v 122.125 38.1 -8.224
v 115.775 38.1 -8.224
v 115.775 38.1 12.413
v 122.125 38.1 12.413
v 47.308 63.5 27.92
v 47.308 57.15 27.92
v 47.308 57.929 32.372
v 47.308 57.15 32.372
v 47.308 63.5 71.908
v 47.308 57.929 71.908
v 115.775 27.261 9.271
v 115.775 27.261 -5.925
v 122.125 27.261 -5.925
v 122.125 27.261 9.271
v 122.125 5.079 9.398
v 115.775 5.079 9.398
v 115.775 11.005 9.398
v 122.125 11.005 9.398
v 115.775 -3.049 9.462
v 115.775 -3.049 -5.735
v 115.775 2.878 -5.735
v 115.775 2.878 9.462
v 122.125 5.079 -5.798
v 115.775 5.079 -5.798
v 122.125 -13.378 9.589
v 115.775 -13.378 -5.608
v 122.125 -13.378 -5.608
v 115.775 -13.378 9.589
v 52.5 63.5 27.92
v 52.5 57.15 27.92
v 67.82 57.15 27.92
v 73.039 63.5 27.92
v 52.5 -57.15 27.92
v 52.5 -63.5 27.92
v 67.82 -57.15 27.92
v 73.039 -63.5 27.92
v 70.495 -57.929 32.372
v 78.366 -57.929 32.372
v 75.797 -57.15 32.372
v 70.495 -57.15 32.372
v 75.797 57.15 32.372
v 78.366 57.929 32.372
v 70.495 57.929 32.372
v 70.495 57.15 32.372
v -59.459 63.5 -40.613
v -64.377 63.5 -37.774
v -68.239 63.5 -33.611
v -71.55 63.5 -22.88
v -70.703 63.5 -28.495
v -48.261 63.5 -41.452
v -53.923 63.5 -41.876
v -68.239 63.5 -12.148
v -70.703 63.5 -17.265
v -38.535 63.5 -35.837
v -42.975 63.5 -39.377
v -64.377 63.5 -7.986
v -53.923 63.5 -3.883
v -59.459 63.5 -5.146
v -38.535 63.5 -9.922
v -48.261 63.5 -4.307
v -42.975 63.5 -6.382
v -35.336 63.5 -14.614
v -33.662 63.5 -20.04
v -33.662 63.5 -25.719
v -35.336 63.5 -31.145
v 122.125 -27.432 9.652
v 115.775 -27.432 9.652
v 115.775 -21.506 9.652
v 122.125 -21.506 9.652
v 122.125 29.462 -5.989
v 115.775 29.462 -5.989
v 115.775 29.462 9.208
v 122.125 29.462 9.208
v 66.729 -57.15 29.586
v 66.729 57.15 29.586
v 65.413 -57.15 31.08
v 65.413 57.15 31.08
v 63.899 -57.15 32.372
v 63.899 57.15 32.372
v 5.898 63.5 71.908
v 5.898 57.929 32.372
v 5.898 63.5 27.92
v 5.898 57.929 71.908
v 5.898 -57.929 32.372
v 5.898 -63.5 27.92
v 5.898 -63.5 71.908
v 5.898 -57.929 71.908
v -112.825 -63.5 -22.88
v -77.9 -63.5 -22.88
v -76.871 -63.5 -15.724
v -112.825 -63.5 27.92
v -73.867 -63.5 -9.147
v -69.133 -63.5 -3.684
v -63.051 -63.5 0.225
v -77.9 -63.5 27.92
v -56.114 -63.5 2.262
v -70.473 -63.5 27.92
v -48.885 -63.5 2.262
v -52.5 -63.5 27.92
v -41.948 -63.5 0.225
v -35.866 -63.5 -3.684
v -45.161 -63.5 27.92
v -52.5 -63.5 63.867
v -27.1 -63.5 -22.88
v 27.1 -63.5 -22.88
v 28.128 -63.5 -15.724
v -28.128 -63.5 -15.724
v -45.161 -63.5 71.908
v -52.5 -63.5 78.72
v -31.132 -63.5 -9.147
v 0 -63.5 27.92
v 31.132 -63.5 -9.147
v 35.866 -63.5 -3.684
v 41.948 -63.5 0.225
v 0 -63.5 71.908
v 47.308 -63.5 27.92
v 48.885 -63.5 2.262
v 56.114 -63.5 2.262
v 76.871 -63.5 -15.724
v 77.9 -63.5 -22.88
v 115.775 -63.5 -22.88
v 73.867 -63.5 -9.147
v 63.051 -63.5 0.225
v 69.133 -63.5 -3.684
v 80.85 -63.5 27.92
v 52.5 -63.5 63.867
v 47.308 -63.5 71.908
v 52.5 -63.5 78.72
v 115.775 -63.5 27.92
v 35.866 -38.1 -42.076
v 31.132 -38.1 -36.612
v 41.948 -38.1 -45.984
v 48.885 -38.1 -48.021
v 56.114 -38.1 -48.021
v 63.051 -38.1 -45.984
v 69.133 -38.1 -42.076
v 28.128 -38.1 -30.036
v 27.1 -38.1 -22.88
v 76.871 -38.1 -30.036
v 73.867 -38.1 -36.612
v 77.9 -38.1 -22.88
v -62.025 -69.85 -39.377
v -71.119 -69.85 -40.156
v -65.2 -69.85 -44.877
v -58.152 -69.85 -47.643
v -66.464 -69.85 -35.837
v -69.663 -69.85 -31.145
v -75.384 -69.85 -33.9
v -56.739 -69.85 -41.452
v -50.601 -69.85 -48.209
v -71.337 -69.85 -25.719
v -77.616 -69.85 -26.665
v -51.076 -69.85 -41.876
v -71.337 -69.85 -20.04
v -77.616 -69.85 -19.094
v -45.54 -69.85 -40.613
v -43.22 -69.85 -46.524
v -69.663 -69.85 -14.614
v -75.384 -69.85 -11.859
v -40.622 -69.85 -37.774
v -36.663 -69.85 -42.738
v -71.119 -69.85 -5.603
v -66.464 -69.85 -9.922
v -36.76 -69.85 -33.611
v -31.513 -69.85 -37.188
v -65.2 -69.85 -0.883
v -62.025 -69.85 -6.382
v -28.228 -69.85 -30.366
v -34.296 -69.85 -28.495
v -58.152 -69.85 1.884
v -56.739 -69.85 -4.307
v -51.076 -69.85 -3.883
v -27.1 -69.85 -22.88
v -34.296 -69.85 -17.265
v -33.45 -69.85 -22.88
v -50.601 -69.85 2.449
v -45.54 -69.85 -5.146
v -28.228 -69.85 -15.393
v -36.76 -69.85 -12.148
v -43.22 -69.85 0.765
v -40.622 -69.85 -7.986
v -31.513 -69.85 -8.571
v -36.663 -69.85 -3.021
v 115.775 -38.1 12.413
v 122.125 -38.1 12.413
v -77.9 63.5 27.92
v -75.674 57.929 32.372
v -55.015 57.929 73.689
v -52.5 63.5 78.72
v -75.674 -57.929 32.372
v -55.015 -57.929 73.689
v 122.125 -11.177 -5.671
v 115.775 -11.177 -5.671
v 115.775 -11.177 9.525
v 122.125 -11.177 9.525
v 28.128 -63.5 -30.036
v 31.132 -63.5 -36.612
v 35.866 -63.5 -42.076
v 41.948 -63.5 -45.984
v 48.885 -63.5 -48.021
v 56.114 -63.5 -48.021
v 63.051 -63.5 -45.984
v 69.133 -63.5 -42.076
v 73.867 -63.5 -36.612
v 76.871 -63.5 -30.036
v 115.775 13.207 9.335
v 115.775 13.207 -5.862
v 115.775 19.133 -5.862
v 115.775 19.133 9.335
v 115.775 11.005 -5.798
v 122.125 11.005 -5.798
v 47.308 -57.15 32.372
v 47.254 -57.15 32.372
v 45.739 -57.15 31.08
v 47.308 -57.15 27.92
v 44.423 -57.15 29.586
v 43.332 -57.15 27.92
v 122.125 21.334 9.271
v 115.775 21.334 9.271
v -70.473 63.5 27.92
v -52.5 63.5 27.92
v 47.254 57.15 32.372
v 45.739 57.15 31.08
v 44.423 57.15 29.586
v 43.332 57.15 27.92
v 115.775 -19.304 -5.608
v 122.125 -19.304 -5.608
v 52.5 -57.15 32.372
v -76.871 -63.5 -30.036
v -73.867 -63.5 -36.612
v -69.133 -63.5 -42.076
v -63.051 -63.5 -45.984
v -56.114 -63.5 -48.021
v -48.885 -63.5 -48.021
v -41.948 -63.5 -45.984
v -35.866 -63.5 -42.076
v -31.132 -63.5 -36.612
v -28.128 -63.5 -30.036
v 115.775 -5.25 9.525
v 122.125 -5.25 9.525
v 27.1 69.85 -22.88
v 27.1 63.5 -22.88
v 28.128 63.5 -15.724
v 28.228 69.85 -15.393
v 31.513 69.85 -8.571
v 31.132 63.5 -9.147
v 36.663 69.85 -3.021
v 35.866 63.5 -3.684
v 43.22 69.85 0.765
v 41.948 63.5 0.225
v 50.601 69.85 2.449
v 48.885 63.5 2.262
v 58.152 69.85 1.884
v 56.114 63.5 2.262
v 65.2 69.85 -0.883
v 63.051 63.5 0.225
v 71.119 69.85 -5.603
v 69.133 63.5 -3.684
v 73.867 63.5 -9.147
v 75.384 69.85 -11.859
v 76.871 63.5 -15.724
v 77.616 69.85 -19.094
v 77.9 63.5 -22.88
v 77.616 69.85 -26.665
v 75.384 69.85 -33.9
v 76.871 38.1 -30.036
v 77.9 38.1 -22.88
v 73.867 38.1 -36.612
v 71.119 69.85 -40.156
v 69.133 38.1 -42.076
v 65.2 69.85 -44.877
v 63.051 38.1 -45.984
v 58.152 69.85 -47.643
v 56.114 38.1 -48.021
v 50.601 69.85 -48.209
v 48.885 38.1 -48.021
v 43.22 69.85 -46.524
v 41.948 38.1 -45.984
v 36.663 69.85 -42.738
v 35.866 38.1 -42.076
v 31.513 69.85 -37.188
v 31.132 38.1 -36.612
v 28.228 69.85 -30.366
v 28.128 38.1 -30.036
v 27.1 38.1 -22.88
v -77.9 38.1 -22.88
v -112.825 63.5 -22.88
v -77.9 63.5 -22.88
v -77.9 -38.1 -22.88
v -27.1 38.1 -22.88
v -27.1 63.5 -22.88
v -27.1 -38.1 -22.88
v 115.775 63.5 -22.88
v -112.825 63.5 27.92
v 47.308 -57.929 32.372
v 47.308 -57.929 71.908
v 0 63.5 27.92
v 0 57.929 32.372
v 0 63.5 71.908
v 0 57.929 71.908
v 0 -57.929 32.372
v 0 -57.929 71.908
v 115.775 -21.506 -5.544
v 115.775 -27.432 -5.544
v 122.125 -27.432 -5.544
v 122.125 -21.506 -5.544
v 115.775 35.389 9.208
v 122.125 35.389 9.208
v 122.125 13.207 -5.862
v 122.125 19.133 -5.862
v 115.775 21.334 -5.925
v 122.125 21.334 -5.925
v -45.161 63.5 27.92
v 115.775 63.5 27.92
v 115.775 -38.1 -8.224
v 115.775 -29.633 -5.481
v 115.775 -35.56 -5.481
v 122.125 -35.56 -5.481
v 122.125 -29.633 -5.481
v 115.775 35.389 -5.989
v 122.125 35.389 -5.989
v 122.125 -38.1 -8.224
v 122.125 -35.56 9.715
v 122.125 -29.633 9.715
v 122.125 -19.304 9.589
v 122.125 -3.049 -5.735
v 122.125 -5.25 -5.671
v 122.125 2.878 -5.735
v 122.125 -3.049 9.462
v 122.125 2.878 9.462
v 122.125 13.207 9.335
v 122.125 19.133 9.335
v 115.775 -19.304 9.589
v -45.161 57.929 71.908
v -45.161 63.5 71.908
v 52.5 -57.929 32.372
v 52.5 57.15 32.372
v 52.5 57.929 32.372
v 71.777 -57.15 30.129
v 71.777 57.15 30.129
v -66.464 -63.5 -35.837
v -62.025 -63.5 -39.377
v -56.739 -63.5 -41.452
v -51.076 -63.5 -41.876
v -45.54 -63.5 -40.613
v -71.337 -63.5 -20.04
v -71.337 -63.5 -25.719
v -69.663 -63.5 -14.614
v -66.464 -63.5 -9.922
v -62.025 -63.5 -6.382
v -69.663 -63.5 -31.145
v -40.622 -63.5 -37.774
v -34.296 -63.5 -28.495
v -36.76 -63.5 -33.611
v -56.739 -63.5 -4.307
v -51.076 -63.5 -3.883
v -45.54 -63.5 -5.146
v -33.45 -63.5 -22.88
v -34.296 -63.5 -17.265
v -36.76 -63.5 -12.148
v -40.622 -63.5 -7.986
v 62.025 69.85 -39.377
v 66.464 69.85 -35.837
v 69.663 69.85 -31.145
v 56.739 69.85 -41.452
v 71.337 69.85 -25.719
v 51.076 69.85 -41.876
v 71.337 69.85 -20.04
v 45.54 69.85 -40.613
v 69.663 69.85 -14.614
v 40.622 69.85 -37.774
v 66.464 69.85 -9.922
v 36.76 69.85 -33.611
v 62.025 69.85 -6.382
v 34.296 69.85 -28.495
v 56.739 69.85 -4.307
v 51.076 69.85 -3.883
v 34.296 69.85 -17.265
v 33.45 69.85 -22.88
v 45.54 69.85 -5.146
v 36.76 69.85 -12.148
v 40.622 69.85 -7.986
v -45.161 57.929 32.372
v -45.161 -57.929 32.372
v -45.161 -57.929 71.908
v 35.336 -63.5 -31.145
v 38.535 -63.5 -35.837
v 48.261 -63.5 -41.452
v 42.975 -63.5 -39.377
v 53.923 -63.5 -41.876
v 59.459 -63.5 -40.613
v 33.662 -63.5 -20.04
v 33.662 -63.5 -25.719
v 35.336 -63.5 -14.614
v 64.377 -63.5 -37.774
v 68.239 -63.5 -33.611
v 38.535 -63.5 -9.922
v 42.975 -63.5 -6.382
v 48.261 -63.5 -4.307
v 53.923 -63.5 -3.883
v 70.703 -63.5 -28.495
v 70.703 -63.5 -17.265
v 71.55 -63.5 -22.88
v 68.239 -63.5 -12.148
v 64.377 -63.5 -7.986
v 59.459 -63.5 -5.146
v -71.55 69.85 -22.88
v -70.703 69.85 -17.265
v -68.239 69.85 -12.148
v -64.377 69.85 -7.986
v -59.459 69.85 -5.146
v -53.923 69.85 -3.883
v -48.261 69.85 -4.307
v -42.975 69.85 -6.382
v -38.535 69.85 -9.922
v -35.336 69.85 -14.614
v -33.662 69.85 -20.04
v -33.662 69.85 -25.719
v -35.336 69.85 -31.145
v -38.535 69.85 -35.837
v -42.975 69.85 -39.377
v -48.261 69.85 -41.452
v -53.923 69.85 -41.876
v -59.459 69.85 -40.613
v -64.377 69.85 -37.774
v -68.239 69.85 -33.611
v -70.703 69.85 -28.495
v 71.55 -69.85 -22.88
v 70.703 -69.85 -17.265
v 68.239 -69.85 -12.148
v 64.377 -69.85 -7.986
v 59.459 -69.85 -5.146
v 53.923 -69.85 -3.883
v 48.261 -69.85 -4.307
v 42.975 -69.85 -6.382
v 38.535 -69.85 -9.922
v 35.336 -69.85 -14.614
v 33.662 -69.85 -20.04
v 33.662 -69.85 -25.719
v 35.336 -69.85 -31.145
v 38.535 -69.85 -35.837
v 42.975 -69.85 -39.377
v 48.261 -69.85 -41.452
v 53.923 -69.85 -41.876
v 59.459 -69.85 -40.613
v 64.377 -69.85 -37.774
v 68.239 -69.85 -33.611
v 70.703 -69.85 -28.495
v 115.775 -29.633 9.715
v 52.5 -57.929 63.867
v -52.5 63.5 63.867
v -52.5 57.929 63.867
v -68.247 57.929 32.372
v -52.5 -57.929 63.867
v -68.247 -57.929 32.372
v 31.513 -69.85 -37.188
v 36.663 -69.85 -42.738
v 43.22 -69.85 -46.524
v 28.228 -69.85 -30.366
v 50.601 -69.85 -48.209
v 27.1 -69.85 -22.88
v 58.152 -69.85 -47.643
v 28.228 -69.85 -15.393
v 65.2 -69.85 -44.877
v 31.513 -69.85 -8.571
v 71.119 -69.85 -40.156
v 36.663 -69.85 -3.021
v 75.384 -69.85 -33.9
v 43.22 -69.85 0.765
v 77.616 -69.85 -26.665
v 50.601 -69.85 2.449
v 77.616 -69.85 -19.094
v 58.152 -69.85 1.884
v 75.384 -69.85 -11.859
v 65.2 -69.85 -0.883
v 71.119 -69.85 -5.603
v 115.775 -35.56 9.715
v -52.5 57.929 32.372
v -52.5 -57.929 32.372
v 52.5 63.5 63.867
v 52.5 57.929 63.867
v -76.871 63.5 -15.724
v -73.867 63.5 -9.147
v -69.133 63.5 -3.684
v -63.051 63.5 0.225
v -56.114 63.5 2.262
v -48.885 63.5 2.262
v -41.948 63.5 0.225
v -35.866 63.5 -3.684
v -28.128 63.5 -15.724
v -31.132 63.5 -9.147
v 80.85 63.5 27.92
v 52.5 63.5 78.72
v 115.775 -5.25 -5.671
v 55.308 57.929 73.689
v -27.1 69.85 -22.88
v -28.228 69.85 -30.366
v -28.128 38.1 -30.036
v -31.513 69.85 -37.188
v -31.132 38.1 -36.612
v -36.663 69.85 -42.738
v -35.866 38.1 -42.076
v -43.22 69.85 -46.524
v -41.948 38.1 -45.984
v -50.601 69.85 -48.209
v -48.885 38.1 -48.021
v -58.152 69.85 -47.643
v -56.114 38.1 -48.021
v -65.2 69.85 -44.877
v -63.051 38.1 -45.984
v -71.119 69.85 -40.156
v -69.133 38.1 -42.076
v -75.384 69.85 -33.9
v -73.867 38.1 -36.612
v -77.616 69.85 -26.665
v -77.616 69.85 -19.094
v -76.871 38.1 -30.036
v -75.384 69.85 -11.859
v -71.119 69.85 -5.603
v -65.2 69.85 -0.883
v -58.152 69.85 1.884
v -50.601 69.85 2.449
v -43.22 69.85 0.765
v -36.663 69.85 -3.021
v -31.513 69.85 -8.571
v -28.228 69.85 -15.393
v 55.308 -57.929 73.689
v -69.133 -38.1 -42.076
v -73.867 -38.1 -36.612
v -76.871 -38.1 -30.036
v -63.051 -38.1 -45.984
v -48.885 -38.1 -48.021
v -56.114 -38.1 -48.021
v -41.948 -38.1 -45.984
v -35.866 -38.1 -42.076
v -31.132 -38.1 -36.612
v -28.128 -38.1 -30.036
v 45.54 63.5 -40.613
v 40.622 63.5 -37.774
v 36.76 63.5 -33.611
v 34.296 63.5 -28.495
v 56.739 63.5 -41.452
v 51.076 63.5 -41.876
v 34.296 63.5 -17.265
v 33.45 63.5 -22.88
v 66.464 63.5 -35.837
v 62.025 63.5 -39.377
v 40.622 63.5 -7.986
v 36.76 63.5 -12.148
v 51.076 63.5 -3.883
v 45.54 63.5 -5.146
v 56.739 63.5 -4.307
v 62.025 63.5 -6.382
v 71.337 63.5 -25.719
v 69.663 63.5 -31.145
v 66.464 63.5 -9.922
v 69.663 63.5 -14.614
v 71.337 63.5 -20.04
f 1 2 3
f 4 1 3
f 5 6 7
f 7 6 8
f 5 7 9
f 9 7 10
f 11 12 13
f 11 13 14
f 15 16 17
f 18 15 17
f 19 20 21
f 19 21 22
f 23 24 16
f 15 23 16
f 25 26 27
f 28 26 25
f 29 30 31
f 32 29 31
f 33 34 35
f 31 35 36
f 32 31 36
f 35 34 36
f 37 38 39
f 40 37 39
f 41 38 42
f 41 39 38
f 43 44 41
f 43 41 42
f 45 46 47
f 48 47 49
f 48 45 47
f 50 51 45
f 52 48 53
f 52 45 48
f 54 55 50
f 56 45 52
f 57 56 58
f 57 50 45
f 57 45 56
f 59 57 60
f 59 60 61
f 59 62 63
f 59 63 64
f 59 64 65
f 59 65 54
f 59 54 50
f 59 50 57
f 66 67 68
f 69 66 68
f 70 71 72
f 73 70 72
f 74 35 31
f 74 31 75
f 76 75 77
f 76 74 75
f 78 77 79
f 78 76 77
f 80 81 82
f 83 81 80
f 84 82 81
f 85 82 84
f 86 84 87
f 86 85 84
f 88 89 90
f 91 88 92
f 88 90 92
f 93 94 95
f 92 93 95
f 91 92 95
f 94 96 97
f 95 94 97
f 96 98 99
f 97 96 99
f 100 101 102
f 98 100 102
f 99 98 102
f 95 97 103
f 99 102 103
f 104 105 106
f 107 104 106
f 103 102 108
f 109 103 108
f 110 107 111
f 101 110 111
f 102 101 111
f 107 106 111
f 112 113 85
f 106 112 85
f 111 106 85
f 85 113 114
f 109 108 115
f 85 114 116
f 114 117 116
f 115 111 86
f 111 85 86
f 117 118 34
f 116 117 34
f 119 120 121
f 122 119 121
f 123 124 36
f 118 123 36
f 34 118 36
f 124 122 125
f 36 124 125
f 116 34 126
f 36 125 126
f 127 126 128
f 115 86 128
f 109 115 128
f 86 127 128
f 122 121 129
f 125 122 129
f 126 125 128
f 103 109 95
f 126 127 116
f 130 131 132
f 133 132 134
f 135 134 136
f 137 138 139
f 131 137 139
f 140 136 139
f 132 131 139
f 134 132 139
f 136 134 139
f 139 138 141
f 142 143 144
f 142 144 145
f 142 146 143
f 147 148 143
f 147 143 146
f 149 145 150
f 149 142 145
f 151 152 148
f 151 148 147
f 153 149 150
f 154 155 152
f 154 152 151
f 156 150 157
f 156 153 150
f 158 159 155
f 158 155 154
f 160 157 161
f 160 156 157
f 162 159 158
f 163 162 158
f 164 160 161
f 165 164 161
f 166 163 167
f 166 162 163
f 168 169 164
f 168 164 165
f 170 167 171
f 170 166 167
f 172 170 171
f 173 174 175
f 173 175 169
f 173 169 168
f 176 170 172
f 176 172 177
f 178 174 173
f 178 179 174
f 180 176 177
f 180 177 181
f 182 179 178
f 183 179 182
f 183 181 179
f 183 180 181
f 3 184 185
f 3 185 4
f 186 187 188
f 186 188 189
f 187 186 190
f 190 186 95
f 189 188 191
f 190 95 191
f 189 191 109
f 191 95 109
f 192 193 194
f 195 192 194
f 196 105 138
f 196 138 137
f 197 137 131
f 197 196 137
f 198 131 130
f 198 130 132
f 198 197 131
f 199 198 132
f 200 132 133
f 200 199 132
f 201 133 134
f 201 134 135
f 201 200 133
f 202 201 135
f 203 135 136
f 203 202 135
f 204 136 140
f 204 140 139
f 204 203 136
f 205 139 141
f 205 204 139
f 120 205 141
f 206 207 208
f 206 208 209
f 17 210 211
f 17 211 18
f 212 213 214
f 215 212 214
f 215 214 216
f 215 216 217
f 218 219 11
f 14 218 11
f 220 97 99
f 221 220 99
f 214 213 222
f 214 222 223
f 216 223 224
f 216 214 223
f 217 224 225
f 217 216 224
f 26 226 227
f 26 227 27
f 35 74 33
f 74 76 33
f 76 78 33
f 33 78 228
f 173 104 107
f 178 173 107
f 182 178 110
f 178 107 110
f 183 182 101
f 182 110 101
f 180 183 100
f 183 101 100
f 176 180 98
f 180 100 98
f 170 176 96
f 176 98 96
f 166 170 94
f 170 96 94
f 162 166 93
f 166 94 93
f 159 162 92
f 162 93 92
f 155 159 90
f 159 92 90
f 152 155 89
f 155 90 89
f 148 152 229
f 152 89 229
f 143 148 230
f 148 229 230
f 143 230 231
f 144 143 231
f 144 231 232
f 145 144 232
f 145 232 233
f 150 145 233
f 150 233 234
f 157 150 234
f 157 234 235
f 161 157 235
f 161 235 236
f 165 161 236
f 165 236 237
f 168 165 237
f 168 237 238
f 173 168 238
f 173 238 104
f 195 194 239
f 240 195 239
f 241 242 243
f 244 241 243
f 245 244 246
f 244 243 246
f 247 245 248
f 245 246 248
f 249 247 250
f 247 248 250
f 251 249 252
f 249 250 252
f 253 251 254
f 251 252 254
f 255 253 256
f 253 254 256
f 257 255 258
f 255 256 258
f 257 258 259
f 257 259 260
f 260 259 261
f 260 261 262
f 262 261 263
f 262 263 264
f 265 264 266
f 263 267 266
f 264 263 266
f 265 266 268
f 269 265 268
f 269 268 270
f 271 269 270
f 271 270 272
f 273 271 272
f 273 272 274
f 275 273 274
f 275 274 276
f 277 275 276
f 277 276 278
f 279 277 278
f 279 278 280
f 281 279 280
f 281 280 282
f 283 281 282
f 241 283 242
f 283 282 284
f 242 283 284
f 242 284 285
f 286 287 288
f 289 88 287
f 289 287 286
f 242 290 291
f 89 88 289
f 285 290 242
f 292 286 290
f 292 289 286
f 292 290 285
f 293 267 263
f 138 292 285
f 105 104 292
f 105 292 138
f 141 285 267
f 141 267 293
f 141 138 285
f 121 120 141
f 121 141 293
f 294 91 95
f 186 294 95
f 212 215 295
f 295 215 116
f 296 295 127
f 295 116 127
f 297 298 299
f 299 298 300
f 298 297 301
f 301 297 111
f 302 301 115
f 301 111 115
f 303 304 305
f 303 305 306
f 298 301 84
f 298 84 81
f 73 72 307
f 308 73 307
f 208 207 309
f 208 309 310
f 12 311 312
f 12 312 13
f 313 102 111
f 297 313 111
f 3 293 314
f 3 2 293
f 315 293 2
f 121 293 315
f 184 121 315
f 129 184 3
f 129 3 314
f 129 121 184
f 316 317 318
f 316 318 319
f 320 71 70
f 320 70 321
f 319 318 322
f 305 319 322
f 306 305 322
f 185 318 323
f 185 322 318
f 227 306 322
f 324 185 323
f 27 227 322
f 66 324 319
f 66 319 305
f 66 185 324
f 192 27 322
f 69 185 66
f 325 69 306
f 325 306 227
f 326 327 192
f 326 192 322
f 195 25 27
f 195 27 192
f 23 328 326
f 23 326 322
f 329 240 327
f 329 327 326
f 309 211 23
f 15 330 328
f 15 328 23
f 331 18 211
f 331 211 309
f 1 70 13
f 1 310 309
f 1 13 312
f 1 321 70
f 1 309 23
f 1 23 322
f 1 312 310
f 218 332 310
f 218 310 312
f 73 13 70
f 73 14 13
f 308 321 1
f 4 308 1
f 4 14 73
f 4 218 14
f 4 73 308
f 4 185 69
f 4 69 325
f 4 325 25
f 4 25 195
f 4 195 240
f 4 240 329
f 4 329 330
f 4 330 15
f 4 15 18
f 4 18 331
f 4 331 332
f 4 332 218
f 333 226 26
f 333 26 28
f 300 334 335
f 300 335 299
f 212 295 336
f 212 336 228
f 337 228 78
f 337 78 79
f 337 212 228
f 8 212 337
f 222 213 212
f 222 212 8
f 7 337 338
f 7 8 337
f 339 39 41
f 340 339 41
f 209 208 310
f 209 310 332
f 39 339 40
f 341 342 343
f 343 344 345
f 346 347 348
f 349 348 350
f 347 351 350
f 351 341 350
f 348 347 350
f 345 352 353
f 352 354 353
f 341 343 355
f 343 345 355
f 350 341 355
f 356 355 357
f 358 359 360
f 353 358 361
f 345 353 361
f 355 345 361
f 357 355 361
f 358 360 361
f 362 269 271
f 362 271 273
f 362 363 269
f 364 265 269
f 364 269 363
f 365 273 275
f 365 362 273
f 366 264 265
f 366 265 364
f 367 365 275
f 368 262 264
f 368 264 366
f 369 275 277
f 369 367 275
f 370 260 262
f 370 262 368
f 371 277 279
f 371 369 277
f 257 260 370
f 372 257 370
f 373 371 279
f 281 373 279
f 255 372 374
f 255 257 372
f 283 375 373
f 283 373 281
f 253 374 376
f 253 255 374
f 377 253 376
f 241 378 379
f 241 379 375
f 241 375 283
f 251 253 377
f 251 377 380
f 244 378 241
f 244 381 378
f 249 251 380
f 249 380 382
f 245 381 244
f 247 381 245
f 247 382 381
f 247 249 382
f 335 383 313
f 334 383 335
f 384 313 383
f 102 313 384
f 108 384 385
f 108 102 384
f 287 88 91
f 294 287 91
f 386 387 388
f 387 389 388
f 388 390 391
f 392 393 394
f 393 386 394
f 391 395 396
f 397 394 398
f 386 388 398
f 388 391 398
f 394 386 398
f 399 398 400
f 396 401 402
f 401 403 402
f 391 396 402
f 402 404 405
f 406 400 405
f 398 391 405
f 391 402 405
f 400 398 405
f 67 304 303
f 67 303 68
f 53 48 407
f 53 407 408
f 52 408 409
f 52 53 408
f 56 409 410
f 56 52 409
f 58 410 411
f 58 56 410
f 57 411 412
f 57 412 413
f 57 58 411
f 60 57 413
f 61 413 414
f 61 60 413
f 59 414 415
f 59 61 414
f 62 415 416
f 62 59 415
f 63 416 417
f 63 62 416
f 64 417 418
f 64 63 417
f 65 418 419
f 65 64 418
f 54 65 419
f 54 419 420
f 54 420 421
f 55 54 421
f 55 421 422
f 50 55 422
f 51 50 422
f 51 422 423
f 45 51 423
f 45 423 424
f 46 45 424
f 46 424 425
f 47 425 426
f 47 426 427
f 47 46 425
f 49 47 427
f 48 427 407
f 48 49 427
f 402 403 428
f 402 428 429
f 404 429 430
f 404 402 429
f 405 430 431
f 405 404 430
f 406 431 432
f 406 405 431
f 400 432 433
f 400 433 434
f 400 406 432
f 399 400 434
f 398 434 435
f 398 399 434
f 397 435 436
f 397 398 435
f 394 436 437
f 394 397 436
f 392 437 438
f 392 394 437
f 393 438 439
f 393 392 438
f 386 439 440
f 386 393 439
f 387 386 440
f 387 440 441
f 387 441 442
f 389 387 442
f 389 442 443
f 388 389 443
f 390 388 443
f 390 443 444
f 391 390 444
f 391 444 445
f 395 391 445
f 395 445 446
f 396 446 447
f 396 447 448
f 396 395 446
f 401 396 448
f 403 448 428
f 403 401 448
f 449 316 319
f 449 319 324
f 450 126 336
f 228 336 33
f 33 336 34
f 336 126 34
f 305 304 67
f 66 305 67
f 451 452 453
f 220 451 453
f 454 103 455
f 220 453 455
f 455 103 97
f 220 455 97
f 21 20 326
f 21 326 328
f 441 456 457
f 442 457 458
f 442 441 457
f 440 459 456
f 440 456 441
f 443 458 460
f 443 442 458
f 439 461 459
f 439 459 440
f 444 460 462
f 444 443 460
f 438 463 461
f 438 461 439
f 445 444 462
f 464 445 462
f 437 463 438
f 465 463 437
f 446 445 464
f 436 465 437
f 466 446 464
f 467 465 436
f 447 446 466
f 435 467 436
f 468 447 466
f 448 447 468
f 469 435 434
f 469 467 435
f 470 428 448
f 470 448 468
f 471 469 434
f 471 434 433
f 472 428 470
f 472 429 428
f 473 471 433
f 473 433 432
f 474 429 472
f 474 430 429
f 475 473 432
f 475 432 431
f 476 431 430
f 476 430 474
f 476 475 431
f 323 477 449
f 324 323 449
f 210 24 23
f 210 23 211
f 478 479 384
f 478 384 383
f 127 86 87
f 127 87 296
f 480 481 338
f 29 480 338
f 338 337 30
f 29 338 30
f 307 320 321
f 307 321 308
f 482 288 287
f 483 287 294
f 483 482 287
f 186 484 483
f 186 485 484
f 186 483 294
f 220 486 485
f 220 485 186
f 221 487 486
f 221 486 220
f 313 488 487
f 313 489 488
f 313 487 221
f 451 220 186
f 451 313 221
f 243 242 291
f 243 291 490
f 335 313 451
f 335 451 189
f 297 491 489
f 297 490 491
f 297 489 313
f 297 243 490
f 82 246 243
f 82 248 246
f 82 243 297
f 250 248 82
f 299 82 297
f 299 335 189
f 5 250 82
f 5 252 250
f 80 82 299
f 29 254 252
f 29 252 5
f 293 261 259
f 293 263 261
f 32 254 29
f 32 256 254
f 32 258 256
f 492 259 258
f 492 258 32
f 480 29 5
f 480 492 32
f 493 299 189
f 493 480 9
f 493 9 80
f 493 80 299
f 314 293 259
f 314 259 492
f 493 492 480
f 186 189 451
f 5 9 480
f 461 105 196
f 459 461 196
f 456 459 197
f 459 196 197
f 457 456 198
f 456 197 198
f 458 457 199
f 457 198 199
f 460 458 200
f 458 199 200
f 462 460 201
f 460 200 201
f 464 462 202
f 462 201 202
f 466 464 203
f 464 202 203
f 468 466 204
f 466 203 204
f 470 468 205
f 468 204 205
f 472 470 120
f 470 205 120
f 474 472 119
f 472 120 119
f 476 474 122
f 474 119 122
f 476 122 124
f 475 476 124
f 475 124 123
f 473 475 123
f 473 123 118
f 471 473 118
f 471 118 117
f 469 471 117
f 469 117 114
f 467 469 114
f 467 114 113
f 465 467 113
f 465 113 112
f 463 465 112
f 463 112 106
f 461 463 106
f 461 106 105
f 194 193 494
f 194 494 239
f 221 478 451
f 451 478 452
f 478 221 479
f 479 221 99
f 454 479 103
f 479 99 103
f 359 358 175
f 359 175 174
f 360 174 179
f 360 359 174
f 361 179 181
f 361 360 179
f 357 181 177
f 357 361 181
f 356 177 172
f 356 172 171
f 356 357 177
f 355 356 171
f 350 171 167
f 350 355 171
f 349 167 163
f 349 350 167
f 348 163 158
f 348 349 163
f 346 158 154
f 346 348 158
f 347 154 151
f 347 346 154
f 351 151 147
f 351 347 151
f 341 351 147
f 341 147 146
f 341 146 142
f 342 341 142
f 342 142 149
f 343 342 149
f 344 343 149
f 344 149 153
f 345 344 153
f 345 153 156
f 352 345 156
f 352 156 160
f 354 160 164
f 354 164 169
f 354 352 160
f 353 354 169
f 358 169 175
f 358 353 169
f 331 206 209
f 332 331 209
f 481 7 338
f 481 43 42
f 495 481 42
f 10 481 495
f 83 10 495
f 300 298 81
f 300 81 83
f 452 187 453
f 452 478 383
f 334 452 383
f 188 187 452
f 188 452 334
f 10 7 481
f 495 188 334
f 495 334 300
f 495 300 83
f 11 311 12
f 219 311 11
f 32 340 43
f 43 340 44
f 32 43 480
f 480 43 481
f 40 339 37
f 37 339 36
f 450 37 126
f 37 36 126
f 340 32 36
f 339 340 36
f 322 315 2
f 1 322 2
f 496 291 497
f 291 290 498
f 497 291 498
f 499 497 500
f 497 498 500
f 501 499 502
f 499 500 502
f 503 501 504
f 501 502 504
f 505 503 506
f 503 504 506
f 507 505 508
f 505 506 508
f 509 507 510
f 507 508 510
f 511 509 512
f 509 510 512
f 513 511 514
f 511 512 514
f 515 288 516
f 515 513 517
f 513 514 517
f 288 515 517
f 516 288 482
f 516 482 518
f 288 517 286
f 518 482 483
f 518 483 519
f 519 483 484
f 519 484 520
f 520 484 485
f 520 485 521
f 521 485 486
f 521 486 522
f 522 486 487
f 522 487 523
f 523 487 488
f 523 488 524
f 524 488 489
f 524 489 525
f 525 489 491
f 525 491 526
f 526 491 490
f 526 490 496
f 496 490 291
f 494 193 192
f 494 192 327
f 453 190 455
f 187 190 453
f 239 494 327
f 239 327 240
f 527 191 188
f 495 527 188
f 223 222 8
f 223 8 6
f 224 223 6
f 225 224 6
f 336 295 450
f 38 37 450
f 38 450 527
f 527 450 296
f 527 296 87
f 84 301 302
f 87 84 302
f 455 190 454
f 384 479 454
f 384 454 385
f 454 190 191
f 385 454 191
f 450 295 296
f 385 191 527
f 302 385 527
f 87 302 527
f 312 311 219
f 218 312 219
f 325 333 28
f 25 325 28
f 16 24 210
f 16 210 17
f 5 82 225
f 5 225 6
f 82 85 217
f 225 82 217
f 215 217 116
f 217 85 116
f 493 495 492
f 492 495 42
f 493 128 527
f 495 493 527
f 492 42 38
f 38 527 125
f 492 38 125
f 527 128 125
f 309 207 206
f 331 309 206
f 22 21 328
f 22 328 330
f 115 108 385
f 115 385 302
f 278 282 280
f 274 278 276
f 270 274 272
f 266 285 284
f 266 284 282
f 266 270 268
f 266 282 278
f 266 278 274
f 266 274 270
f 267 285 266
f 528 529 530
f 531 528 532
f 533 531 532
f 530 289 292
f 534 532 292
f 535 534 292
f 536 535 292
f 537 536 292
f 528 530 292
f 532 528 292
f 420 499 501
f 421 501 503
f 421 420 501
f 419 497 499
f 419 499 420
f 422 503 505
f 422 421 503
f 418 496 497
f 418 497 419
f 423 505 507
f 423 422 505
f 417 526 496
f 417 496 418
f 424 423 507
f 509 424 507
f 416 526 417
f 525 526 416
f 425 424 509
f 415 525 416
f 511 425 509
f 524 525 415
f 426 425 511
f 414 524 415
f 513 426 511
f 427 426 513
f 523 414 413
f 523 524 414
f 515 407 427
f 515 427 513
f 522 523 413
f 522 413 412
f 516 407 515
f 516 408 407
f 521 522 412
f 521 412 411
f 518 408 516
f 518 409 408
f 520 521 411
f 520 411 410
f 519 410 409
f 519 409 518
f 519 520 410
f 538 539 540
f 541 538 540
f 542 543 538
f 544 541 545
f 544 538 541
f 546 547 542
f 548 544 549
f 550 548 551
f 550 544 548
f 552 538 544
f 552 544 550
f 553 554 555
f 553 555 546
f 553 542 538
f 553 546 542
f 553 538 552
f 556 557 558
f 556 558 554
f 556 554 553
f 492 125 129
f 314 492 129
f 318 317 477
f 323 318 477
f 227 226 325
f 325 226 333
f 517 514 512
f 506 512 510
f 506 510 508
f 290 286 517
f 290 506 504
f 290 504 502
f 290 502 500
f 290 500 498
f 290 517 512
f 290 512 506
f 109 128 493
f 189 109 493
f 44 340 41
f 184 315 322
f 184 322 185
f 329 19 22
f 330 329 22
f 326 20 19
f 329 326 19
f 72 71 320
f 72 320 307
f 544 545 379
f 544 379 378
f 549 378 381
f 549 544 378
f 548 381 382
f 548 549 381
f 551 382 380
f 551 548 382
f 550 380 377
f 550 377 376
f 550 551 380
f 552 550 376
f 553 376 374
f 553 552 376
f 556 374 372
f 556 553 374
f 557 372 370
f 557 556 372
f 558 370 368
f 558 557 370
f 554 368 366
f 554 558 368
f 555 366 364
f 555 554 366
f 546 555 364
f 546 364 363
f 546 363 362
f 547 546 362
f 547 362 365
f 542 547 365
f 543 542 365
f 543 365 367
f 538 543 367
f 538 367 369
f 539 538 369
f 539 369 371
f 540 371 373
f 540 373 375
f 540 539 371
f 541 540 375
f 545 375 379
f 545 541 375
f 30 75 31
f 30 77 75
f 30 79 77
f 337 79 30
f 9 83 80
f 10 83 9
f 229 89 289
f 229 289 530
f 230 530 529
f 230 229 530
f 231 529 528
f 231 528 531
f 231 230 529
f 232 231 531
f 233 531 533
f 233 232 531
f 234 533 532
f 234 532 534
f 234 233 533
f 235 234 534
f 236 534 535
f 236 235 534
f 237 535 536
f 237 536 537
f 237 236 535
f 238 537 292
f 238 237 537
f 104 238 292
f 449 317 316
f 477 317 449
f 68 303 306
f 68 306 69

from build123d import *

# Parameters (mm, degrees)
F0_W       = 228.6
F0_H       = 50.8
F1_DEPTH   = 63.5
F2_R       = 25.4
F3_DEPTH   = 25.4
F5_W       = 133.35
F5_H       = 127
F6_DEPTH   = 50.8
F8_DEPTH   = 127.001
F9_W       = 114.3
F9_H       = 45.4757122113
F10_DEPTH  = 25.4
F11_DEPTH  = 25.4
F13_DEPTH  = 127.001
F14_W      = 45.1612845063
F14_H      = 43.987744288
F14_W_2    = 41.4102021605
F15_DEPTH  = 127.001
F15_FACE_W = 114.3
F15_FACE_H = 14.0218776853
F18_W      = 115.8576831222
F18_H      = 41.3168929517
F19_DEPTH  = 191.9764496515
F20_W      = 76.2
F20_H      = 20.6366241442
F20_W_2    = 5.92666582
F20_H_2    = 15.1961888187
F21_DEPTH  = 6.35
F22_R      = 19.05
F23_DEPTH  = 6.35
F24_R      = 19.05
F25_DEPTH  = 6.35


with BuildPart() as f1:
    # F0 (on Front) → F1 (new body, symmetric)
    with BuildSketch(Plane.XZ):
        with Locations((1.4754496515, 2.5203571515)):
            Rectangle(F0_W, F0_H)
    extrude(amount=F1_DEPTH, both=True)

    # F2 (on face) → F3 (join)
    with BuildSketch(Plane.XZ.offset(63.5)):
        with BuildLine():
            ThreePointArc((-77.8995503485, -22.8796428485), (-52.4995503485, -48.2796428485), (-27.0995503485, -22.8796428485))
            ThreePointArc((-27.0995503485, -22.8796428485), (-52.4995503485, 2.5203571515), (-77.8995503485, -22.8796428485))
        make_face()
        with Locations((52.4995503485, -22.8796428485)):
            Circle(F2_R)
    extrude(amount=-F3_DEPTH)

    # F4: F1 across plane


with BuildPart() as f1_1:
    add(f1.part)
    add(f1.part.mirror(Plane.XZ))

    # F5 (on face) → F6 (join)
    with BuildSketch(Plane.XY.offset(27.9203571515)):
        with Locations((14.1754496515, 0)):
            Rectangle(F5_W, F5_H)
    extrude(amount=F6_DEPTH)

    # F7 (on face) → F8 (cut, through all)
    with BuildSketch(Plane.XZ.offset(63.5)):
        Polygon((80.8504496515, 78.7203571515), (52.4995503485, 78.7203571515), (80.8504496515, 27.9203571515), align=None)
    extrude(amount=-F8_DEPTH, mode=Mode.SUBTRACT)

    # F9 (on face) → F10 (cut)
    with BuildSketch(Plane(origin=(73.5304715342, 0, 41.0365156332), x_dir=(0, 1, 0), z_dir=(0.8732166409, 0, 0.4873322255))):
        with Locations((0, 14.0673470279)):
            Rectangle(F9_W, F9_H)
    extrude(amount=-F10_DEPTH, mode=Mode.SUBTRACT)

    # F11 (add): a face of the model
    f11_faces = [f1_1.faces().sort_by_distance(p)[0] for p in [
        (-52.4995503485, 0, 53.3203571515),
    ]]
    extrude(f11_faces, amount=F11_DEPTH)

    # F12 (on face) → F13 (cut, through all)
    with BuildSketch(Plane.XZ.offset(63.5)):
        Polygon((-77.8995503485, 78.7203571515), (-77.8995503485, 27.9203571515), (-52.4995503485, 78.7203571515), align=None)
    extrude(amount=-F13_DEPTH, mode=Mode.SUBTRACT)

    # F14 (on face) → F15 (cut, through all)
    with BuildSketch(Plane.XZ.offset(63.5)):
        Polygon((-52.4995503485, 27.9203571515), (-52.4995503485, 63.8672858477), (-70.4730146966, 27.9203571515), align=None)
        with Locations((-22.5806422532, 49.9142292955)):
            Rectangle(F14_W, F14_H)
        with Locations((26.6029974446, 49.9142292955)):
            Rectangle(F14_W_2, F14_H)
        Polygon((73.0387046933, 27.9203571515), (52.4995503485, 63.8672858477), (52.4995503485, 27.9203571515), align=None)
    extrude(amount=-F15_DEPTH, mode=Mode.SUBTRACT)

    # F15_face (on face) → F16 (revolve)
    with BuildSketch(Plane(origin=(61.698255806, 0, 24.5037007223), x_dir=(0, -1, 0), z_dir=(-0.4873322255, 0, 0.8732166409))):
        Rectangle(F15_FACE_W, F15_FACE_H)
    revolve(axis=Axis((55.5761873402, 0, 21.0870442932), (0, -1, 0)))

    # F18 (on offset) → F19 (cut, through all)
    with BuildSketch(Plane.YZ.offset(-76.2)):
        with Locations((7.4506e-06, 53.0304405838)):
            Rectangle(F18_W, F18_H)
    extrude(amount=F19_DEPTH, mode=Mode.SUBTRACT)

    # F20 (on face) → F21 (join)
    with BuildSketch(Plane.YZ.offset(115.7754496515)):
        with Locations((0, 2.0944098942)):
            Rectangle(F20_W, F20_H)
        with Locations((-32.59666709, 2.1173956338)):
            Rectangle(F20_W_2, F20_H_2, mode=Mode.SUBTRACT)
        with Locations((-24.4689150477, 2.0539075275)):
            Rectangle(F20_W_2, F20_H_2, mode=Mode.SUBTRACT)
        with Locations((-16.3411630055, 1.9904194212)):
            Rectangle(F20_W_2, F20_H_2, mode=Mode.SUBTRACT)
        with Locations((-8.2134109632, 1.9269313149)):
            Rectangle(F20_W_2, F20_H_2, mode=Mode.SUBTRACT)
        with Locations((-0.085658921, 1.8634432086)):
            Rectangle(F20_W_2, F20_H_2, mode=Mode.SUBTRACT)
        with Locations((8.0420931213, 1.7999551023)):
            Rectangle(F20_W_2, F20_H_2, mode=Mode.SUBTRACT)
        with Locations((16.1698451635, 1.736466996)):
            Rectangle(F20_W_2, F20_H_2, mode=Mode.SUBTRACT)
        with Locations((24.2975972058, 1.6729788898)):
            Rectangle(F20_W_2, F20_H_2, mode=Mode.SUBTRACT)
        with Locations((32.425349248, 1.6094907835)):
            Rectangle(F20_W_2, F20_H_2, mode=Mode.SUBTRACT)
    extrude(amount=F21_DEPTH)

    # F22 (on face) → F23 (join)
    with BuildSketch(Plane(origin=(0, 63.5, 0), x_dir=(-1, 0, 0), z_dir=(0, 1, 0))):
        with BuildLine():
            ThreePointArc((-77.8995503485, -22.8796428485), (-52.4995503485, -48.2796428485), (-27.0995503485, -22.8796428485))
            ThreePointArc((-27.0995503485, -22.8796428485), (-52.4995503485, 2.5203571515), (-77.8995503485, -22.8796428485))
        make_face()
        with Locations((-52.4995503485, -22.8796428485)):
            Circle(F22_R, mode=Mode.SUBTRACT)
        with BuildLine():
            ThreePointArc((77.8995503485, -22.8796428485), (52.4995503485, 2.5203571515), (27.0995503485, -22.8796428485))
            ThreePointArc((27.0995503485, -22.8796428485), (52.4995503485, -48.2796428485), (77.8995503485, -22.8796428485))
        make_face()
        with Locations((52.4995503485, -22.8796428485)):
            Circle(F22_R, mode=Mode.SUBTRACT)
    extrude(amount=F23_DEPTH)

    # F24 (on face) → F25 (join)
    with BuildSketch(Plane.XZ.offset(63.5)):
        with BuildLine():
            ThreePointArc((-77.8995503485, -22.8796428485), (-52.4995503485, -48.2796428485), (-27.0995503485, -22.8796428485))
            ThreePointArc((-27.0995503485, -22.8796428485), (-52.4995503485, 2.5203571515), (-77.8995503485, -22.8796428485))
        make_face()
        with Locations((-52.4995503485, -22.8796428485)):
            Circle(F24_R, mode=Mode.SUBTRACT)
        with BuildLine():
            ThreePointArc((77.8995503485, -22.8796428485), (52.4995503485, 2.5203571515), (27.0995503485, -22.8796428485))
            ThreePointArc((27.0995503485, -22.8796428485), (52.4995503485, -48.2796428485), (77.8995503485, -22.8796428485))
        make_face()
        with Locations((52.4995503485, -22.8796428485)):
            Circle(F24_R, mode=Mode.SUBTRACT)
    extrude(amount=F25_DEPTH)


solid = f1_1.part
